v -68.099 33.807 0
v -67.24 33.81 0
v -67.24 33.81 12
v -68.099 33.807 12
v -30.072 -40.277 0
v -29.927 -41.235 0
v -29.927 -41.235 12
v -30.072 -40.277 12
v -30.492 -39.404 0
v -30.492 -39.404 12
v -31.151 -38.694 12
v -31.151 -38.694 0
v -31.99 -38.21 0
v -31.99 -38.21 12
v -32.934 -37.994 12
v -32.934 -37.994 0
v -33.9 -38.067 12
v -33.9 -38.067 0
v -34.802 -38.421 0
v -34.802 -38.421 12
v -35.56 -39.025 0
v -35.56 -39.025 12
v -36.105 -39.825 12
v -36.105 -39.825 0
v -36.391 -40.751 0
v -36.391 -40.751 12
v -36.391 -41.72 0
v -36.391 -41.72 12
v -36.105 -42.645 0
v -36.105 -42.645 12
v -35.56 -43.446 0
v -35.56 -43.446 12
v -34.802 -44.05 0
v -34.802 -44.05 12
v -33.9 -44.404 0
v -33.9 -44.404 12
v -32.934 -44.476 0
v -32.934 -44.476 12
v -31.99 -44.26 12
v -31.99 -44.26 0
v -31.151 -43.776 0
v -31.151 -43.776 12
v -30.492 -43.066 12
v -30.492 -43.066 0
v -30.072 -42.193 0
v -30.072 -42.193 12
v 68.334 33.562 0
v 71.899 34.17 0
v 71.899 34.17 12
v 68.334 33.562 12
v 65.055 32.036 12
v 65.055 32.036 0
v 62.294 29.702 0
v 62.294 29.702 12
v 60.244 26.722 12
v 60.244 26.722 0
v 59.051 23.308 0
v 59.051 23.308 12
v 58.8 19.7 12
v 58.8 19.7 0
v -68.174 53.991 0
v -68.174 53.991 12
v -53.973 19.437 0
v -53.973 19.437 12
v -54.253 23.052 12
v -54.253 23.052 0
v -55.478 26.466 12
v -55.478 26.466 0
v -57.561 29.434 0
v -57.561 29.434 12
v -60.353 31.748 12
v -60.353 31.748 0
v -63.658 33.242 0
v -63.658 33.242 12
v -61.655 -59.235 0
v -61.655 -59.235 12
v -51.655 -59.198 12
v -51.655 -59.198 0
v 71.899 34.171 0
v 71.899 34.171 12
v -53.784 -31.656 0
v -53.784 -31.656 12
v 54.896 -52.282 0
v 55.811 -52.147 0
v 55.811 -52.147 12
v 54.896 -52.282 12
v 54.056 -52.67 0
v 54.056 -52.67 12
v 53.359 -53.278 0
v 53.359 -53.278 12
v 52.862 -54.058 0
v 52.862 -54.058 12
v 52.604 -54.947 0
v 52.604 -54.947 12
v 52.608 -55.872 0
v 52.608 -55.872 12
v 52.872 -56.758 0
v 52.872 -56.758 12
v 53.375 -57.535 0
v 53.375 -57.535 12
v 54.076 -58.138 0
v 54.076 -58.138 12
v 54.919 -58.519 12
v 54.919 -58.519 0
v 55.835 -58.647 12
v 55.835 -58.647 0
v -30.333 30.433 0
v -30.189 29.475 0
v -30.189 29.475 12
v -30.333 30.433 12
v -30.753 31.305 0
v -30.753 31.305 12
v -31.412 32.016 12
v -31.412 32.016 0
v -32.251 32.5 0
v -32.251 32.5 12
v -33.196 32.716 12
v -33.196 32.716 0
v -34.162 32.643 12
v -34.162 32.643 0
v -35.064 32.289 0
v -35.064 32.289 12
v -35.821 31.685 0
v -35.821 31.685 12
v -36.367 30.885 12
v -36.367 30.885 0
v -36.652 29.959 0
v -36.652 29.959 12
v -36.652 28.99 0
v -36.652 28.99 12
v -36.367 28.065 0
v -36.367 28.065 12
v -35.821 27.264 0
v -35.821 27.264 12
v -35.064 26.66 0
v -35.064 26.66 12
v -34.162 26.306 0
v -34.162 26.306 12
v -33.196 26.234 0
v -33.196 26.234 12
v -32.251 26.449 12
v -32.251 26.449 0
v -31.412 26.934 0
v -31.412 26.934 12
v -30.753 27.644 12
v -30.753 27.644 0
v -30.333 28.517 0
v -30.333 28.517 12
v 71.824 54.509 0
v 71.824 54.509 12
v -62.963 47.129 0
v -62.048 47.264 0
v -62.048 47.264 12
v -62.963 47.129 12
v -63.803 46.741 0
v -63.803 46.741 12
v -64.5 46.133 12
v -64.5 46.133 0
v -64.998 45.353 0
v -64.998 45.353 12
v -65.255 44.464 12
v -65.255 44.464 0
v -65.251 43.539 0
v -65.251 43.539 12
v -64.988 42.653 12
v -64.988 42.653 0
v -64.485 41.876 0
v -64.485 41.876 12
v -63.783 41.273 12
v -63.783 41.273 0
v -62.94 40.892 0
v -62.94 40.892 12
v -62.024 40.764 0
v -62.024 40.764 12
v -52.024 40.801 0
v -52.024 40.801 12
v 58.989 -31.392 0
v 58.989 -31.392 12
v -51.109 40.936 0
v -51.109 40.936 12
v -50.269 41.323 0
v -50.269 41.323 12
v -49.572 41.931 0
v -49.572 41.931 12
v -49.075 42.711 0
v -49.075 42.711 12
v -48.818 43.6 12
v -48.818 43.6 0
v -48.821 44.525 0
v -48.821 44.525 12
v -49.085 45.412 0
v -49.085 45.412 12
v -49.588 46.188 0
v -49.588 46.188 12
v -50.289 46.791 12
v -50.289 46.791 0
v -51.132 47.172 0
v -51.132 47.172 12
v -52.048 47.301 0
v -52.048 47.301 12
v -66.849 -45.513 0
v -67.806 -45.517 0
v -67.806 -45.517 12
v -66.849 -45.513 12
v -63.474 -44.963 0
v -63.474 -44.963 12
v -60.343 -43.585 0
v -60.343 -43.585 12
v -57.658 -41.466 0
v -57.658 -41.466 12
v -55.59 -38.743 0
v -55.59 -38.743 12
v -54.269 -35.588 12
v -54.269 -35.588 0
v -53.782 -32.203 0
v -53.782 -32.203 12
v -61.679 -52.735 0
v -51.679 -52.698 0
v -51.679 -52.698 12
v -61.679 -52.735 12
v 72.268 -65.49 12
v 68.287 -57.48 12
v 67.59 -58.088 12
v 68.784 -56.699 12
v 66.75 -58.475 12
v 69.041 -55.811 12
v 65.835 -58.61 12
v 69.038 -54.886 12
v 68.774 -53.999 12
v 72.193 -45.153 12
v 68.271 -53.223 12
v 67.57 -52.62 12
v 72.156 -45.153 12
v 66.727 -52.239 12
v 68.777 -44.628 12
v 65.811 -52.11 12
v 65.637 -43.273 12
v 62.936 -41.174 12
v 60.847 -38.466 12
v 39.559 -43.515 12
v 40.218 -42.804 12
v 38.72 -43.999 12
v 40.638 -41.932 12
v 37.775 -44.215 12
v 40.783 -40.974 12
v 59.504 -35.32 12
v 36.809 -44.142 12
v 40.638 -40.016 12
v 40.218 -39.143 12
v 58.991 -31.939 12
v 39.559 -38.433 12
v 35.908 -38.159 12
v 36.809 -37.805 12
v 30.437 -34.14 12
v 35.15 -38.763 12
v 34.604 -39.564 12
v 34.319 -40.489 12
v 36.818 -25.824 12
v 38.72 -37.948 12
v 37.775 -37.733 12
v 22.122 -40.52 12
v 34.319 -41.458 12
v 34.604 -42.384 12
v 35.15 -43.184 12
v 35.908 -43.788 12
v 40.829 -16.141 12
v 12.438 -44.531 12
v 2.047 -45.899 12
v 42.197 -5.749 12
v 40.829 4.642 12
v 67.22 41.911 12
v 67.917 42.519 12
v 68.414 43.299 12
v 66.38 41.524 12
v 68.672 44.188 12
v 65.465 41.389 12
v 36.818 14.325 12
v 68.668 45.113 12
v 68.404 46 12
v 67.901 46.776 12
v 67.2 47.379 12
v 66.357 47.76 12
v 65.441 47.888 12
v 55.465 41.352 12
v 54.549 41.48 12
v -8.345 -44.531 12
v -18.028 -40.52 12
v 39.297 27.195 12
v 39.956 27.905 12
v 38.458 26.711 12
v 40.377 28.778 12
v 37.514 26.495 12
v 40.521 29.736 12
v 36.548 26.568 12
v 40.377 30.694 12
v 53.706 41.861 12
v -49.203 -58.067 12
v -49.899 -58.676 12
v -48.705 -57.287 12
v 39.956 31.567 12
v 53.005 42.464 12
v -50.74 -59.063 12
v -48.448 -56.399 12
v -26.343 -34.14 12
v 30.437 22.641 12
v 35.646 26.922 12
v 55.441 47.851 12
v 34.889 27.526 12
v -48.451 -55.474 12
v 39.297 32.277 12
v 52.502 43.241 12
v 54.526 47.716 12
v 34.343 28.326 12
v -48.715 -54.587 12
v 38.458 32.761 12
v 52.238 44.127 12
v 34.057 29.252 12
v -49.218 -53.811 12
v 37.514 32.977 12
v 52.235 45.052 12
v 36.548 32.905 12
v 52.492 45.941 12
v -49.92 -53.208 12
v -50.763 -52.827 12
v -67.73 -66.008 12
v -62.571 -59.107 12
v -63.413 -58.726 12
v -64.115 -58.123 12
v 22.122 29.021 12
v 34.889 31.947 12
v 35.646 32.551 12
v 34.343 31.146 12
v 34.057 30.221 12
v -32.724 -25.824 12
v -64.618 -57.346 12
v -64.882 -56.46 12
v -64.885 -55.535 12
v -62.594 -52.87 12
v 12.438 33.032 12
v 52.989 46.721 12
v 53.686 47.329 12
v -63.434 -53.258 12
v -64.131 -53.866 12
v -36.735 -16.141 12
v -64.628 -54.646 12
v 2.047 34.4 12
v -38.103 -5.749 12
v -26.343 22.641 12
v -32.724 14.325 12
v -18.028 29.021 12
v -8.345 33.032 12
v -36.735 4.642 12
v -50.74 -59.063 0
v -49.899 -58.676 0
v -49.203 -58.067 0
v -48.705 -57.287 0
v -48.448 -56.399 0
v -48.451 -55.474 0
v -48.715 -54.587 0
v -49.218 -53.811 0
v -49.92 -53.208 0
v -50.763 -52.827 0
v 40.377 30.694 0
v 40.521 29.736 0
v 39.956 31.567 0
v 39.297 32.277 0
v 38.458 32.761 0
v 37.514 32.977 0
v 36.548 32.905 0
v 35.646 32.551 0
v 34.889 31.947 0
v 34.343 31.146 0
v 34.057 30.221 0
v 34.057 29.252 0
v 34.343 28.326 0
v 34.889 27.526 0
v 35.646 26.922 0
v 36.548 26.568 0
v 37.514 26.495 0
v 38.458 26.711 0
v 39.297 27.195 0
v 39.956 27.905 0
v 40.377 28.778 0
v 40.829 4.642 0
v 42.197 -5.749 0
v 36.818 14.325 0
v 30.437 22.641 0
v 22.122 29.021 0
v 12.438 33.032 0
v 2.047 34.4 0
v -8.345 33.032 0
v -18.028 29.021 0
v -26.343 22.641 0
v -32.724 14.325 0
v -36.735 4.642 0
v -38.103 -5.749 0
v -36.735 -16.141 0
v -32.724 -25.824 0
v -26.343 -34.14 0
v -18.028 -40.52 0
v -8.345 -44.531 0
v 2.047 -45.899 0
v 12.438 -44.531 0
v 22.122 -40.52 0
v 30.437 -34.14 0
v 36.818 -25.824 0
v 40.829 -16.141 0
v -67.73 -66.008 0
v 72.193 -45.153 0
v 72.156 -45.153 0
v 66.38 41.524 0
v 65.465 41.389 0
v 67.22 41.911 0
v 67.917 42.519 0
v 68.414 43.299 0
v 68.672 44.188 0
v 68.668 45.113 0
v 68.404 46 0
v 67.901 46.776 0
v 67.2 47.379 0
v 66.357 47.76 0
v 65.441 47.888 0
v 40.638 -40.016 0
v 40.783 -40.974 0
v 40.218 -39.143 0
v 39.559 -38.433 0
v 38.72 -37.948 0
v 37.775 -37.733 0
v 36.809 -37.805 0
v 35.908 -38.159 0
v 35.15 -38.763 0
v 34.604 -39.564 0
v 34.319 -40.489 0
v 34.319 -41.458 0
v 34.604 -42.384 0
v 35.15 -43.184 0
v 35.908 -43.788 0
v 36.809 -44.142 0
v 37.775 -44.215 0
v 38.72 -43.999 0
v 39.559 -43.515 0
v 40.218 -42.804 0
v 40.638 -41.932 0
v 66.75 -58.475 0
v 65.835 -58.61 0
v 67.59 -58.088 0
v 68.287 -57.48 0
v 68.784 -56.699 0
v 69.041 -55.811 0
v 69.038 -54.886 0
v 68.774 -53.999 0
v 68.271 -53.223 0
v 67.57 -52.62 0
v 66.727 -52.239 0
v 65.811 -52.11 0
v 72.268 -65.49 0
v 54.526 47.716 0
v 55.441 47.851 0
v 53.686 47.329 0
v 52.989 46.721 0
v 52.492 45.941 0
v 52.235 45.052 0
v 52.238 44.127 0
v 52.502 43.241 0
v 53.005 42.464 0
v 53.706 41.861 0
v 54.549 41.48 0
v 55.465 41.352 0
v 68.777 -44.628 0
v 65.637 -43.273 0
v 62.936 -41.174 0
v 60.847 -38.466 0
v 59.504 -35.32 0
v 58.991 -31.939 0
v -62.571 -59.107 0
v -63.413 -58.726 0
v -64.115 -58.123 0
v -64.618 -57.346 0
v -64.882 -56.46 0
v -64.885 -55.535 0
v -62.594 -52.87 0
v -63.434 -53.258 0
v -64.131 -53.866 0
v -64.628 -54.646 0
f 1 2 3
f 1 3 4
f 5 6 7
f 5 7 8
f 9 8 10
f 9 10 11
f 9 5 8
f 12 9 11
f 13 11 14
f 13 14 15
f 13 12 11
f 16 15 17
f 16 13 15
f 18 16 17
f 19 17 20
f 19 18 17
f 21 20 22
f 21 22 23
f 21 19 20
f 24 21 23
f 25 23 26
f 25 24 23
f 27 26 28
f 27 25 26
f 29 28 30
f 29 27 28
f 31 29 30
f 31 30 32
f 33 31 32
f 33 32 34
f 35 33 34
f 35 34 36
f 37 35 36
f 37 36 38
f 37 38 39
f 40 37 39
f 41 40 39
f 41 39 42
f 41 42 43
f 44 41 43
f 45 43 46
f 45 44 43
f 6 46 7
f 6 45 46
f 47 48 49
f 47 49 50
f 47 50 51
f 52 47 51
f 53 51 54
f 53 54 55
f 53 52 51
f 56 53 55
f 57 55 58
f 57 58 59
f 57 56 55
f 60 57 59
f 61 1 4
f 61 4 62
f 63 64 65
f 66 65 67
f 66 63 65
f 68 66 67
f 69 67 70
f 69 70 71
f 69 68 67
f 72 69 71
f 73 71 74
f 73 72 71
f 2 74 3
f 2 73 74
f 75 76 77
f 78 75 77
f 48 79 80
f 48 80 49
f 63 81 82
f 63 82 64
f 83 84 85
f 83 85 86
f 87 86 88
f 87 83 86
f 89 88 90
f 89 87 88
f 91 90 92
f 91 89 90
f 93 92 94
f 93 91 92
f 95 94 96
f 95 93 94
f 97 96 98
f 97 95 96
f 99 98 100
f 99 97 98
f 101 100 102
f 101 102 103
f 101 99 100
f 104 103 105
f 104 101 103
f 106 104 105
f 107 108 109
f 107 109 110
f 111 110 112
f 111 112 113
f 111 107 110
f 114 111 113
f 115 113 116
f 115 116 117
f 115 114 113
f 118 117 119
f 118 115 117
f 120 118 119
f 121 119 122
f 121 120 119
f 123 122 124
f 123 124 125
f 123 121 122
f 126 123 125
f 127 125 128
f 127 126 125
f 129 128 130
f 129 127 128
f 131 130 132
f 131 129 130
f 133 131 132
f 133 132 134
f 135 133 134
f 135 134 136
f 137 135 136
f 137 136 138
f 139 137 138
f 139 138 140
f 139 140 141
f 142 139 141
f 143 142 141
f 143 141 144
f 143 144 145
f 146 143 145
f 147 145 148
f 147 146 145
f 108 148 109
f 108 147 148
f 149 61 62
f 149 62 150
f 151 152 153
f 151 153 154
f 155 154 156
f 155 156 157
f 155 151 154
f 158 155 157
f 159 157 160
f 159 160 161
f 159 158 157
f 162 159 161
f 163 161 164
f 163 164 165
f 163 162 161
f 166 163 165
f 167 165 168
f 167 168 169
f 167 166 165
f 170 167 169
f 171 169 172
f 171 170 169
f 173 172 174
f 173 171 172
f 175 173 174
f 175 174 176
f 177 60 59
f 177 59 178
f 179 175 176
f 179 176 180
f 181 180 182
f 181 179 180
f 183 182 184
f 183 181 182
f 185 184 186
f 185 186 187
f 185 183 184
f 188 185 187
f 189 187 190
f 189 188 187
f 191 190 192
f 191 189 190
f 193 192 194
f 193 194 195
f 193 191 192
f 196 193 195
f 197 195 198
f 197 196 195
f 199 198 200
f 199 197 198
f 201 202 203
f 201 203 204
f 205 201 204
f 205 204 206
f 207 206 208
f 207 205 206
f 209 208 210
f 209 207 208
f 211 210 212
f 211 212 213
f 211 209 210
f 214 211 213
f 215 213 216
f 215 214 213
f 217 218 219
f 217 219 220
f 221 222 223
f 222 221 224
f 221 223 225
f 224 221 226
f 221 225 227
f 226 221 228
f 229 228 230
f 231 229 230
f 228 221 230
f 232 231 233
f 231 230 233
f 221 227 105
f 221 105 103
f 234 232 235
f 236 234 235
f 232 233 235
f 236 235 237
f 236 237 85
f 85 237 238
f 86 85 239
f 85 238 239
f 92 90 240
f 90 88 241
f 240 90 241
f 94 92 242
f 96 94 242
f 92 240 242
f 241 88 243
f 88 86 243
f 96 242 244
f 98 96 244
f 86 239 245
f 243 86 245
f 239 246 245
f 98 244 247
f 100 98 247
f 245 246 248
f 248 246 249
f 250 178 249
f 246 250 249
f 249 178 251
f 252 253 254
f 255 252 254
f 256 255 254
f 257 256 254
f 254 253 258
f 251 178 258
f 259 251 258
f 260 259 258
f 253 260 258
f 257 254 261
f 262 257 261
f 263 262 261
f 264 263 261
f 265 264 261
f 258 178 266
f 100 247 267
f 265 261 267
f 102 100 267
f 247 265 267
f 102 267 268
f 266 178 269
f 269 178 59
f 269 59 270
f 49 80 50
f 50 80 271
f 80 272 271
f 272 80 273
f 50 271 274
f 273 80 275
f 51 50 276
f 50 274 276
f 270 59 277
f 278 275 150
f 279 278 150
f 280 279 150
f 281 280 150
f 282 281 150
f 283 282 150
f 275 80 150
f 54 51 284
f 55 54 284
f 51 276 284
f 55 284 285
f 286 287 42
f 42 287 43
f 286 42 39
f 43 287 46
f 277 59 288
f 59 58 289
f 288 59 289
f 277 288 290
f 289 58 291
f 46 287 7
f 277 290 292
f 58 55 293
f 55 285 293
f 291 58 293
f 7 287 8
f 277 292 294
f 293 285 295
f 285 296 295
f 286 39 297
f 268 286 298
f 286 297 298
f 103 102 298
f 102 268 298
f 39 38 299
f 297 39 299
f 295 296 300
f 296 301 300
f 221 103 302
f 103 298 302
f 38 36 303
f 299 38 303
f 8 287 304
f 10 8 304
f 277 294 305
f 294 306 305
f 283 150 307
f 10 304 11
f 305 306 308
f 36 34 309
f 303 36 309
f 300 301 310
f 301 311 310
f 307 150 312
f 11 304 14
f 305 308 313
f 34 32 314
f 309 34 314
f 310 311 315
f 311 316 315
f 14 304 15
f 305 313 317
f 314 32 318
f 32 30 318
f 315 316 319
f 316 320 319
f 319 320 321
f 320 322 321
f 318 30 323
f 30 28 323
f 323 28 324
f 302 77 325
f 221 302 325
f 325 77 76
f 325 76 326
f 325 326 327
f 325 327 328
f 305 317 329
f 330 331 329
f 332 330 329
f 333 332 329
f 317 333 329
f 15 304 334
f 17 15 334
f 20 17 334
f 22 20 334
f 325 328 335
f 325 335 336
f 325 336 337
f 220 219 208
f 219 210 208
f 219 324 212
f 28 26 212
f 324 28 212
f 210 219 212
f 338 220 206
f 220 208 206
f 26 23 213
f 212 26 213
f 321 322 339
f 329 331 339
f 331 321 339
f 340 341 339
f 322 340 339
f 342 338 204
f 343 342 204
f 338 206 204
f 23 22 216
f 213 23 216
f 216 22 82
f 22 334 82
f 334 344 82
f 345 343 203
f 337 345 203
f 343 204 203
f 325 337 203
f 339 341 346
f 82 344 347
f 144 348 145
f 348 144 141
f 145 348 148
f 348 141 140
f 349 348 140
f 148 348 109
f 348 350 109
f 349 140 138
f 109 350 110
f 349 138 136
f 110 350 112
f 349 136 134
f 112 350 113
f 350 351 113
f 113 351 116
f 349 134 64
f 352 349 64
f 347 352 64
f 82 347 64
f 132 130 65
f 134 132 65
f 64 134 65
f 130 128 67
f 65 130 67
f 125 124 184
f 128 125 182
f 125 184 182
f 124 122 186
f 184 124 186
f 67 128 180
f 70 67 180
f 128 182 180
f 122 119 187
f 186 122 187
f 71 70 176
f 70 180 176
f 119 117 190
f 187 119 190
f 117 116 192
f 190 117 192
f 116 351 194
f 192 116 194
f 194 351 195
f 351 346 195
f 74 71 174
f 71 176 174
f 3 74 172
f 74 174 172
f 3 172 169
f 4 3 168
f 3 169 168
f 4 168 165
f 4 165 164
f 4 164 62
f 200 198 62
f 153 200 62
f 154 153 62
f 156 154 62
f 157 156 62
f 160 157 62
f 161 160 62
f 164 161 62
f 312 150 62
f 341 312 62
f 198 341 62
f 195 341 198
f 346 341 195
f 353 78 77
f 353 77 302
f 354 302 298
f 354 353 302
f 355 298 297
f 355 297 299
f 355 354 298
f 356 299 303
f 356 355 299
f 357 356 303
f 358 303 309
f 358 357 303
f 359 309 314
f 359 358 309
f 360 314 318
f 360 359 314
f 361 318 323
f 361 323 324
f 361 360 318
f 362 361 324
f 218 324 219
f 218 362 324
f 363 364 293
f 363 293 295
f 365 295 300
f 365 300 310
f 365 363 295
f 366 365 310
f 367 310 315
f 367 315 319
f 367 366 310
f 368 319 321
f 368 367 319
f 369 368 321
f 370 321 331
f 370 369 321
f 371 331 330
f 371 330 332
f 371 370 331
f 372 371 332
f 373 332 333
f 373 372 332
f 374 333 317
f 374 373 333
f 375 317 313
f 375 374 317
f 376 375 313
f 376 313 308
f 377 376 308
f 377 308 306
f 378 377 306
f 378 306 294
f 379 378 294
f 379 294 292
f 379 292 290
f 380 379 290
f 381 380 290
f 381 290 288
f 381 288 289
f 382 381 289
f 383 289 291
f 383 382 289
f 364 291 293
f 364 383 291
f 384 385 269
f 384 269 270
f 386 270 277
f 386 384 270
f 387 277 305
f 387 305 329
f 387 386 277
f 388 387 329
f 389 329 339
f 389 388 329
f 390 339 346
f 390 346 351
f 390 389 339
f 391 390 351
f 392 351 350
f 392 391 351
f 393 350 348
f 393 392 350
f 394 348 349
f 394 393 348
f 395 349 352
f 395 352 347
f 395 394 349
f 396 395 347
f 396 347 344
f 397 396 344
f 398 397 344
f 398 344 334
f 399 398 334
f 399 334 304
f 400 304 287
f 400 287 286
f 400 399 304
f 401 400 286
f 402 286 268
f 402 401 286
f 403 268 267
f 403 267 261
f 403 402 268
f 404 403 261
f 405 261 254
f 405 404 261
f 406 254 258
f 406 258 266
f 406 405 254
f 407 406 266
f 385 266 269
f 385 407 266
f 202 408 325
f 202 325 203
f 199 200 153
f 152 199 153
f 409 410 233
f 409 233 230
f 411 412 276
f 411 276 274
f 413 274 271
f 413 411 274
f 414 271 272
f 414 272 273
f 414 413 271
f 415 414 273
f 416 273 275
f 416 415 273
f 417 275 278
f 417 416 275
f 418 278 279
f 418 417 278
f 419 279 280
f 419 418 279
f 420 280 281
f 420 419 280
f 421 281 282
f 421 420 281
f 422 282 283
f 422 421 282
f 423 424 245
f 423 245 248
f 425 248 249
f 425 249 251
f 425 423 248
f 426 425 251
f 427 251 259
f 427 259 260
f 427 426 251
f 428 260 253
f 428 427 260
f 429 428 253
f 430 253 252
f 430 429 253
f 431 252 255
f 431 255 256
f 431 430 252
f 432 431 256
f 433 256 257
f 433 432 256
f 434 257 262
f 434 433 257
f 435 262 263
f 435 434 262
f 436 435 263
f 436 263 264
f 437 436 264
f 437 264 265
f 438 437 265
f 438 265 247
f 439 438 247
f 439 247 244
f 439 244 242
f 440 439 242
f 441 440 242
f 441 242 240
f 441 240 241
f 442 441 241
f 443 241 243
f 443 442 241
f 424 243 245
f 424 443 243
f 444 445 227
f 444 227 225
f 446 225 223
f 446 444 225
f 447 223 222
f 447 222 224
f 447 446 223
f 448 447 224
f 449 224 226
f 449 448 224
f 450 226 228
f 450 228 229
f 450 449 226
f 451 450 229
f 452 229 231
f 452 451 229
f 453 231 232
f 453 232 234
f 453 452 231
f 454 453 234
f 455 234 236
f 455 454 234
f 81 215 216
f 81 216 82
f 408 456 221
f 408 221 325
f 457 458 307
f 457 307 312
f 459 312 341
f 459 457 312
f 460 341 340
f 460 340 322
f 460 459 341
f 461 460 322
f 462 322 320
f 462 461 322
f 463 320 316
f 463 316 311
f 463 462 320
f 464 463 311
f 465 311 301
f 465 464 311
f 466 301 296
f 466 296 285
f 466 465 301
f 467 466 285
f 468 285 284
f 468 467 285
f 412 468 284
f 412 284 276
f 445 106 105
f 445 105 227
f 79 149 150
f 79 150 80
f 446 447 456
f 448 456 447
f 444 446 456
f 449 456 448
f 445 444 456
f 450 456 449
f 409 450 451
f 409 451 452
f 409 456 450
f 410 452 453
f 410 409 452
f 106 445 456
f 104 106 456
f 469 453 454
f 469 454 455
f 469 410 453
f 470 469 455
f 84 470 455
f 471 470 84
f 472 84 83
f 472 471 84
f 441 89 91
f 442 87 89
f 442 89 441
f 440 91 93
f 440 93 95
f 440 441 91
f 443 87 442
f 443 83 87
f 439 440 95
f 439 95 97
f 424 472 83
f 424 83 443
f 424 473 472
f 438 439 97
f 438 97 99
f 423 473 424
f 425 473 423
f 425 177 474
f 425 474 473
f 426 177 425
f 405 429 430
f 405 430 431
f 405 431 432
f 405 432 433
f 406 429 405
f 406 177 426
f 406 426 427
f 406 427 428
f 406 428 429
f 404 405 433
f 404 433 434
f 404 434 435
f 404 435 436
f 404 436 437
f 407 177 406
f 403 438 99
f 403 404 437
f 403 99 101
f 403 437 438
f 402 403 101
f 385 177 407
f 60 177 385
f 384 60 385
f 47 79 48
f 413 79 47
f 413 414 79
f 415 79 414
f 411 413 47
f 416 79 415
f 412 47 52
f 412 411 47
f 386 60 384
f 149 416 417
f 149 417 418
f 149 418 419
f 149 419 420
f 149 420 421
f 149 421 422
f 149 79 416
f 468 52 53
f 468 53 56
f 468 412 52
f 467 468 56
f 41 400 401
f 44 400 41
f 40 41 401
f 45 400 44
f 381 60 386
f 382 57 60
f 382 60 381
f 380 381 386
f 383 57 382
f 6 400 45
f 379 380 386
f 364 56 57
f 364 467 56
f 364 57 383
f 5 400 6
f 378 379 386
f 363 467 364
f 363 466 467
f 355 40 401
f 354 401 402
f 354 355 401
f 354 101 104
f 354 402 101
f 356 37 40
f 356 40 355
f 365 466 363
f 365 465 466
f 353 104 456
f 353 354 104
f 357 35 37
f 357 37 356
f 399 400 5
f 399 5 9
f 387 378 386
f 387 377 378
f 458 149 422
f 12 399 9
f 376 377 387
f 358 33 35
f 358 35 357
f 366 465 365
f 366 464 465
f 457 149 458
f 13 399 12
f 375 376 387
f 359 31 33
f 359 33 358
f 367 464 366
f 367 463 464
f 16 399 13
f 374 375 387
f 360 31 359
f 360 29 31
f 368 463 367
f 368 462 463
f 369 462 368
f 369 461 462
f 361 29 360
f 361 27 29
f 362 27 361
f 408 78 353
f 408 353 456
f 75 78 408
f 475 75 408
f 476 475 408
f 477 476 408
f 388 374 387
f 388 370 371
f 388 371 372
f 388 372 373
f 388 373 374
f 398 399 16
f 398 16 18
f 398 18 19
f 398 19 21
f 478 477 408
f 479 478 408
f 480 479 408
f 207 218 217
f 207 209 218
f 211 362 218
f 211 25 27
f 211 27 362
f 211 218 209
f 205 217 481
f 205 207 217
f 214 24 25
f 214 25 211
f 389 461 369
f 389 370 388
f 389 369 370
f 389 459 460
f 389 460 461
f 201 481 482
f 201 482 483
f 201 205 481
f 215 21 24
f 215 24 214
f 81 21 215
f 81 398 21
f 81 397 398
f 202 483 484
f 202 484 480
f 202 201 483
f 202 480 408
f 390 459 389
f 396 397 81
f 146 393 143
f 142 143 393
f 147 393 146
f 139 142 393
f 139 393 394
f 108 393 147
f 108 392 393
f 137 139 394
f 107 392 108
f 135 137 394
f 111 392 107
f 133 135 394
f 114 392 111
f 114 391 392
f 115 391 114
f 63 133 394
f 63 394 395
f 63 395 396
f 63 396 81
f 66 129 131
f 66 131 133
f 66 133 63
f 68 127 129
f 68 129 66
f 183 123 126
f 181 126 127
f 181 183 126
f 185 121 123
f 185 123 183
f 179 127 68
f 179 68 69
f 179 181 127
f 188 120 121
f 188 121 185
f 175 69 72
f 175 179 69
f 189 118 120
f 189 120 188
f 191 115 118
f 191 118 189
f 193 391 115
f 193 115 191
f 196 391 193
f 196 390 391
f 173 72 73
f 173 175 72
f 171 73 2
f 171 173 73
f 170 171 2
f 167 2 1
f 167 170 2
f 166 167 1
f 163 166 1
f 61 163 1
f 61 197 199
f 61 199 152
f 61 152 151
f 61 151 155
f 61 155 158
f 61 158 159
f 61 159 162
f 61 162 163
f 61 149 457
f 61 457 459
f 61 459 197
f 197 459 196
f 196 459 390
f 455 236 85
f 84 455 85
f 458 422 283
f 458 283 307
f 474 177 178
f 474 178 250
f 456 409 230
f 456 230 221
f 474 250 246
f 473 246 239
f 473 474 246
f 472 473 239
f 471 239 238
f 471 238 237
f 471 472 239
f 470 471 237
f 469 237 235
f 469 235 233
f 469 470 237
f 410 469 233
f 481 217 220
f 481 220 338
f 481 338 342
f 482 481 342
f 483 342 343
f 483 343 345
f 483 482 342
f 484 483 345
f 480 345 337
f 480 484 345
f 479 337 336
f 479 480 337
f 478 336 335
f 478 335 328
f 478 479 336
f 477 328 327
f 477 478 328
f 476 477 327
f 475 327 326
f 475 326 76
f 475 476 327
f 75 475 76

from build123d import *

# Parameters (mm, degrees)
SKETCH1_R           = 40.149801581
SKETCH1_R_2         = 3.249983939
BOSS_EXTRUDE1_DEPTH = 12


with BuildPart() as part:
    # Sketch1 → Boss-Extrude1 (new body)
    with BuildSketch(Plane.XY):
        with BuildLine():
            Line((-68.174111389, 53.990948604), (71.824239973, 54.508639483))
            Line((71.824239973, 54.508639483), (71.899444011, 34.171326758))
            Line((71.899444011, 34.171326758), (71.89945068, 34.169523305))
            ThreePointArc((71.89945068, 34.169523305), (62.293513488, 29.701666637), (58.799882097, 19.700151139))
            Line((58.799882097, 19.700151139), (58.988814164, -31.392458227))
            Line((58.988814164, -31.392458227), (58.990835115, -31.938981122))
            ThreePointArc((58.990835115, -31.938981122), (62.935928372, -41.173957513), (72.156427876, -45.152768721))
            Line((72.156427876, -45.152768721), (72.192770973, -45.15263433))
            Line((72.192770973, -45.15263433), (72.267975011, -65.489947056))
            Line((72.267975011, -65.489947056), (-67.730376351, -66.007637935))
            Line((-67.730376351, -66.007637935), (-67.806147753, -45.51689395))
            Line((-67.806147753, -45.51689395), (-66.849217099, -45.513355378))
            ThreePointArc((-66.849217099, -45.513355378), (-57.65839533, -41.466462132), (-53.781707876, -32.202562082))
            Line((-53.781707876, -32.202562082), (-53.783728828, -31.656039187))
            Line((-53.783728828, -31.656039187), (-53.972660895, 19.436570179))
            ThreePointArc((-53.972660895, 19.436570179), (-57.560711521, 29.434286706), (-67.23952414, 33.810247094))
            Line((-67.23952414, 33.810247094), (-68.099474715, 33.807067138))
            Line((-68.099474715, 33.807067138), (-68.174111389, 53.990948604))
        make_face()
        with Locations((2.046931811, -5.749499226)):
            Circle(SKETCH1_R, mode=Mode.SUBTRACT)
        with Locations((-33.438727493, 29.474686699)):
            Circle(SKETCH1_R_2, mode=Mode.SUBTRACT)
        with Locations((-33.177254114, -41.235158529)):
            Circle(SKETCH1_R_2, mode=Mode.SUBTRACT)
        with Locations((37.532591115, -40.973685151)):
            Circle(SKETCH1_R_2, mode=Mode.SUBTRACT)
        with Locations((37.271117736, 29.736160078)):
            Circle(SKETCH1_R_2, mode=Mode.SUBTRACT)
        with BuildLine():
            Line((65.81073891, -52.110366387), (55.810856699, -52.147344307))
            ThreePointArc((55.810856699, -52.147344307), (52.572912804, -55.40932385), (55.834892347, -58.647267744))
            Line((55.834892347, -58.647267744), (65.834774558, -58.610289825))
            ThreePointArc((65.834774558, -58.610289825), (69.072718453, -55.348310282), (65.81073891, -52.110366387))
        make_face(mode=Mode.SUBTRACT)
        with BuildLine():
            Line((-61.654525972, -59.235157648), (-51.654643761, -59.198179728))
            ThreePointArc((-51.654643761, -59.198179728), (-48.416699866, -55.936200186), (-51.678679409, -52.698256291))
            Line((-51.678679409, -52.698256291), (-61.67856162, -52.735234211))
            ThreePointArc((-61.67856162, -52.735234211), (-64.916505515, -55.997213753), (-61.654525972, -59.235157648))
        make_face(mode=Mode.SUBTRACT)
        with BuildLine():
            Line((55.465113149, 41.351554371), (65.46499536, 41.388532291))
            ThreePointArc((65.46499536, 41.388532291), (68.702939255, 44.650511834), (65.440959712, 47.888455729))
            Line((65.440959712, 47.888455729), (55.441077501, 47.851477809))
            ThreePointArc((55.441077501, 47.851477809), (52.203133606, 44.589498266), (55.465113149, 41.351554371))
        make_face(mode=Mode.SUBTRACT)
        with BuildLine():
            Line((-52.048458607, 47.300565825), (-62.048340818, 47.263587905))
            ThreePointArc((-62.048340818, 47.263587905), (-65.286284713, 44.001608363), (-62.024305171, 40.763664468))
            Line((-62.024305171, 40.763664468), (-52.024422959, 40.800642388))
            ThreePointArc((-52.024422959, 40.800642388), (-48.786479064, 44.06262193), (-52.048458607, 47.300565825))
        make_face(mode=Mode.SUBTRACT)
    extrude(amount=BOSS_EXTRUDE1_DEPTH)


solid = part.part
